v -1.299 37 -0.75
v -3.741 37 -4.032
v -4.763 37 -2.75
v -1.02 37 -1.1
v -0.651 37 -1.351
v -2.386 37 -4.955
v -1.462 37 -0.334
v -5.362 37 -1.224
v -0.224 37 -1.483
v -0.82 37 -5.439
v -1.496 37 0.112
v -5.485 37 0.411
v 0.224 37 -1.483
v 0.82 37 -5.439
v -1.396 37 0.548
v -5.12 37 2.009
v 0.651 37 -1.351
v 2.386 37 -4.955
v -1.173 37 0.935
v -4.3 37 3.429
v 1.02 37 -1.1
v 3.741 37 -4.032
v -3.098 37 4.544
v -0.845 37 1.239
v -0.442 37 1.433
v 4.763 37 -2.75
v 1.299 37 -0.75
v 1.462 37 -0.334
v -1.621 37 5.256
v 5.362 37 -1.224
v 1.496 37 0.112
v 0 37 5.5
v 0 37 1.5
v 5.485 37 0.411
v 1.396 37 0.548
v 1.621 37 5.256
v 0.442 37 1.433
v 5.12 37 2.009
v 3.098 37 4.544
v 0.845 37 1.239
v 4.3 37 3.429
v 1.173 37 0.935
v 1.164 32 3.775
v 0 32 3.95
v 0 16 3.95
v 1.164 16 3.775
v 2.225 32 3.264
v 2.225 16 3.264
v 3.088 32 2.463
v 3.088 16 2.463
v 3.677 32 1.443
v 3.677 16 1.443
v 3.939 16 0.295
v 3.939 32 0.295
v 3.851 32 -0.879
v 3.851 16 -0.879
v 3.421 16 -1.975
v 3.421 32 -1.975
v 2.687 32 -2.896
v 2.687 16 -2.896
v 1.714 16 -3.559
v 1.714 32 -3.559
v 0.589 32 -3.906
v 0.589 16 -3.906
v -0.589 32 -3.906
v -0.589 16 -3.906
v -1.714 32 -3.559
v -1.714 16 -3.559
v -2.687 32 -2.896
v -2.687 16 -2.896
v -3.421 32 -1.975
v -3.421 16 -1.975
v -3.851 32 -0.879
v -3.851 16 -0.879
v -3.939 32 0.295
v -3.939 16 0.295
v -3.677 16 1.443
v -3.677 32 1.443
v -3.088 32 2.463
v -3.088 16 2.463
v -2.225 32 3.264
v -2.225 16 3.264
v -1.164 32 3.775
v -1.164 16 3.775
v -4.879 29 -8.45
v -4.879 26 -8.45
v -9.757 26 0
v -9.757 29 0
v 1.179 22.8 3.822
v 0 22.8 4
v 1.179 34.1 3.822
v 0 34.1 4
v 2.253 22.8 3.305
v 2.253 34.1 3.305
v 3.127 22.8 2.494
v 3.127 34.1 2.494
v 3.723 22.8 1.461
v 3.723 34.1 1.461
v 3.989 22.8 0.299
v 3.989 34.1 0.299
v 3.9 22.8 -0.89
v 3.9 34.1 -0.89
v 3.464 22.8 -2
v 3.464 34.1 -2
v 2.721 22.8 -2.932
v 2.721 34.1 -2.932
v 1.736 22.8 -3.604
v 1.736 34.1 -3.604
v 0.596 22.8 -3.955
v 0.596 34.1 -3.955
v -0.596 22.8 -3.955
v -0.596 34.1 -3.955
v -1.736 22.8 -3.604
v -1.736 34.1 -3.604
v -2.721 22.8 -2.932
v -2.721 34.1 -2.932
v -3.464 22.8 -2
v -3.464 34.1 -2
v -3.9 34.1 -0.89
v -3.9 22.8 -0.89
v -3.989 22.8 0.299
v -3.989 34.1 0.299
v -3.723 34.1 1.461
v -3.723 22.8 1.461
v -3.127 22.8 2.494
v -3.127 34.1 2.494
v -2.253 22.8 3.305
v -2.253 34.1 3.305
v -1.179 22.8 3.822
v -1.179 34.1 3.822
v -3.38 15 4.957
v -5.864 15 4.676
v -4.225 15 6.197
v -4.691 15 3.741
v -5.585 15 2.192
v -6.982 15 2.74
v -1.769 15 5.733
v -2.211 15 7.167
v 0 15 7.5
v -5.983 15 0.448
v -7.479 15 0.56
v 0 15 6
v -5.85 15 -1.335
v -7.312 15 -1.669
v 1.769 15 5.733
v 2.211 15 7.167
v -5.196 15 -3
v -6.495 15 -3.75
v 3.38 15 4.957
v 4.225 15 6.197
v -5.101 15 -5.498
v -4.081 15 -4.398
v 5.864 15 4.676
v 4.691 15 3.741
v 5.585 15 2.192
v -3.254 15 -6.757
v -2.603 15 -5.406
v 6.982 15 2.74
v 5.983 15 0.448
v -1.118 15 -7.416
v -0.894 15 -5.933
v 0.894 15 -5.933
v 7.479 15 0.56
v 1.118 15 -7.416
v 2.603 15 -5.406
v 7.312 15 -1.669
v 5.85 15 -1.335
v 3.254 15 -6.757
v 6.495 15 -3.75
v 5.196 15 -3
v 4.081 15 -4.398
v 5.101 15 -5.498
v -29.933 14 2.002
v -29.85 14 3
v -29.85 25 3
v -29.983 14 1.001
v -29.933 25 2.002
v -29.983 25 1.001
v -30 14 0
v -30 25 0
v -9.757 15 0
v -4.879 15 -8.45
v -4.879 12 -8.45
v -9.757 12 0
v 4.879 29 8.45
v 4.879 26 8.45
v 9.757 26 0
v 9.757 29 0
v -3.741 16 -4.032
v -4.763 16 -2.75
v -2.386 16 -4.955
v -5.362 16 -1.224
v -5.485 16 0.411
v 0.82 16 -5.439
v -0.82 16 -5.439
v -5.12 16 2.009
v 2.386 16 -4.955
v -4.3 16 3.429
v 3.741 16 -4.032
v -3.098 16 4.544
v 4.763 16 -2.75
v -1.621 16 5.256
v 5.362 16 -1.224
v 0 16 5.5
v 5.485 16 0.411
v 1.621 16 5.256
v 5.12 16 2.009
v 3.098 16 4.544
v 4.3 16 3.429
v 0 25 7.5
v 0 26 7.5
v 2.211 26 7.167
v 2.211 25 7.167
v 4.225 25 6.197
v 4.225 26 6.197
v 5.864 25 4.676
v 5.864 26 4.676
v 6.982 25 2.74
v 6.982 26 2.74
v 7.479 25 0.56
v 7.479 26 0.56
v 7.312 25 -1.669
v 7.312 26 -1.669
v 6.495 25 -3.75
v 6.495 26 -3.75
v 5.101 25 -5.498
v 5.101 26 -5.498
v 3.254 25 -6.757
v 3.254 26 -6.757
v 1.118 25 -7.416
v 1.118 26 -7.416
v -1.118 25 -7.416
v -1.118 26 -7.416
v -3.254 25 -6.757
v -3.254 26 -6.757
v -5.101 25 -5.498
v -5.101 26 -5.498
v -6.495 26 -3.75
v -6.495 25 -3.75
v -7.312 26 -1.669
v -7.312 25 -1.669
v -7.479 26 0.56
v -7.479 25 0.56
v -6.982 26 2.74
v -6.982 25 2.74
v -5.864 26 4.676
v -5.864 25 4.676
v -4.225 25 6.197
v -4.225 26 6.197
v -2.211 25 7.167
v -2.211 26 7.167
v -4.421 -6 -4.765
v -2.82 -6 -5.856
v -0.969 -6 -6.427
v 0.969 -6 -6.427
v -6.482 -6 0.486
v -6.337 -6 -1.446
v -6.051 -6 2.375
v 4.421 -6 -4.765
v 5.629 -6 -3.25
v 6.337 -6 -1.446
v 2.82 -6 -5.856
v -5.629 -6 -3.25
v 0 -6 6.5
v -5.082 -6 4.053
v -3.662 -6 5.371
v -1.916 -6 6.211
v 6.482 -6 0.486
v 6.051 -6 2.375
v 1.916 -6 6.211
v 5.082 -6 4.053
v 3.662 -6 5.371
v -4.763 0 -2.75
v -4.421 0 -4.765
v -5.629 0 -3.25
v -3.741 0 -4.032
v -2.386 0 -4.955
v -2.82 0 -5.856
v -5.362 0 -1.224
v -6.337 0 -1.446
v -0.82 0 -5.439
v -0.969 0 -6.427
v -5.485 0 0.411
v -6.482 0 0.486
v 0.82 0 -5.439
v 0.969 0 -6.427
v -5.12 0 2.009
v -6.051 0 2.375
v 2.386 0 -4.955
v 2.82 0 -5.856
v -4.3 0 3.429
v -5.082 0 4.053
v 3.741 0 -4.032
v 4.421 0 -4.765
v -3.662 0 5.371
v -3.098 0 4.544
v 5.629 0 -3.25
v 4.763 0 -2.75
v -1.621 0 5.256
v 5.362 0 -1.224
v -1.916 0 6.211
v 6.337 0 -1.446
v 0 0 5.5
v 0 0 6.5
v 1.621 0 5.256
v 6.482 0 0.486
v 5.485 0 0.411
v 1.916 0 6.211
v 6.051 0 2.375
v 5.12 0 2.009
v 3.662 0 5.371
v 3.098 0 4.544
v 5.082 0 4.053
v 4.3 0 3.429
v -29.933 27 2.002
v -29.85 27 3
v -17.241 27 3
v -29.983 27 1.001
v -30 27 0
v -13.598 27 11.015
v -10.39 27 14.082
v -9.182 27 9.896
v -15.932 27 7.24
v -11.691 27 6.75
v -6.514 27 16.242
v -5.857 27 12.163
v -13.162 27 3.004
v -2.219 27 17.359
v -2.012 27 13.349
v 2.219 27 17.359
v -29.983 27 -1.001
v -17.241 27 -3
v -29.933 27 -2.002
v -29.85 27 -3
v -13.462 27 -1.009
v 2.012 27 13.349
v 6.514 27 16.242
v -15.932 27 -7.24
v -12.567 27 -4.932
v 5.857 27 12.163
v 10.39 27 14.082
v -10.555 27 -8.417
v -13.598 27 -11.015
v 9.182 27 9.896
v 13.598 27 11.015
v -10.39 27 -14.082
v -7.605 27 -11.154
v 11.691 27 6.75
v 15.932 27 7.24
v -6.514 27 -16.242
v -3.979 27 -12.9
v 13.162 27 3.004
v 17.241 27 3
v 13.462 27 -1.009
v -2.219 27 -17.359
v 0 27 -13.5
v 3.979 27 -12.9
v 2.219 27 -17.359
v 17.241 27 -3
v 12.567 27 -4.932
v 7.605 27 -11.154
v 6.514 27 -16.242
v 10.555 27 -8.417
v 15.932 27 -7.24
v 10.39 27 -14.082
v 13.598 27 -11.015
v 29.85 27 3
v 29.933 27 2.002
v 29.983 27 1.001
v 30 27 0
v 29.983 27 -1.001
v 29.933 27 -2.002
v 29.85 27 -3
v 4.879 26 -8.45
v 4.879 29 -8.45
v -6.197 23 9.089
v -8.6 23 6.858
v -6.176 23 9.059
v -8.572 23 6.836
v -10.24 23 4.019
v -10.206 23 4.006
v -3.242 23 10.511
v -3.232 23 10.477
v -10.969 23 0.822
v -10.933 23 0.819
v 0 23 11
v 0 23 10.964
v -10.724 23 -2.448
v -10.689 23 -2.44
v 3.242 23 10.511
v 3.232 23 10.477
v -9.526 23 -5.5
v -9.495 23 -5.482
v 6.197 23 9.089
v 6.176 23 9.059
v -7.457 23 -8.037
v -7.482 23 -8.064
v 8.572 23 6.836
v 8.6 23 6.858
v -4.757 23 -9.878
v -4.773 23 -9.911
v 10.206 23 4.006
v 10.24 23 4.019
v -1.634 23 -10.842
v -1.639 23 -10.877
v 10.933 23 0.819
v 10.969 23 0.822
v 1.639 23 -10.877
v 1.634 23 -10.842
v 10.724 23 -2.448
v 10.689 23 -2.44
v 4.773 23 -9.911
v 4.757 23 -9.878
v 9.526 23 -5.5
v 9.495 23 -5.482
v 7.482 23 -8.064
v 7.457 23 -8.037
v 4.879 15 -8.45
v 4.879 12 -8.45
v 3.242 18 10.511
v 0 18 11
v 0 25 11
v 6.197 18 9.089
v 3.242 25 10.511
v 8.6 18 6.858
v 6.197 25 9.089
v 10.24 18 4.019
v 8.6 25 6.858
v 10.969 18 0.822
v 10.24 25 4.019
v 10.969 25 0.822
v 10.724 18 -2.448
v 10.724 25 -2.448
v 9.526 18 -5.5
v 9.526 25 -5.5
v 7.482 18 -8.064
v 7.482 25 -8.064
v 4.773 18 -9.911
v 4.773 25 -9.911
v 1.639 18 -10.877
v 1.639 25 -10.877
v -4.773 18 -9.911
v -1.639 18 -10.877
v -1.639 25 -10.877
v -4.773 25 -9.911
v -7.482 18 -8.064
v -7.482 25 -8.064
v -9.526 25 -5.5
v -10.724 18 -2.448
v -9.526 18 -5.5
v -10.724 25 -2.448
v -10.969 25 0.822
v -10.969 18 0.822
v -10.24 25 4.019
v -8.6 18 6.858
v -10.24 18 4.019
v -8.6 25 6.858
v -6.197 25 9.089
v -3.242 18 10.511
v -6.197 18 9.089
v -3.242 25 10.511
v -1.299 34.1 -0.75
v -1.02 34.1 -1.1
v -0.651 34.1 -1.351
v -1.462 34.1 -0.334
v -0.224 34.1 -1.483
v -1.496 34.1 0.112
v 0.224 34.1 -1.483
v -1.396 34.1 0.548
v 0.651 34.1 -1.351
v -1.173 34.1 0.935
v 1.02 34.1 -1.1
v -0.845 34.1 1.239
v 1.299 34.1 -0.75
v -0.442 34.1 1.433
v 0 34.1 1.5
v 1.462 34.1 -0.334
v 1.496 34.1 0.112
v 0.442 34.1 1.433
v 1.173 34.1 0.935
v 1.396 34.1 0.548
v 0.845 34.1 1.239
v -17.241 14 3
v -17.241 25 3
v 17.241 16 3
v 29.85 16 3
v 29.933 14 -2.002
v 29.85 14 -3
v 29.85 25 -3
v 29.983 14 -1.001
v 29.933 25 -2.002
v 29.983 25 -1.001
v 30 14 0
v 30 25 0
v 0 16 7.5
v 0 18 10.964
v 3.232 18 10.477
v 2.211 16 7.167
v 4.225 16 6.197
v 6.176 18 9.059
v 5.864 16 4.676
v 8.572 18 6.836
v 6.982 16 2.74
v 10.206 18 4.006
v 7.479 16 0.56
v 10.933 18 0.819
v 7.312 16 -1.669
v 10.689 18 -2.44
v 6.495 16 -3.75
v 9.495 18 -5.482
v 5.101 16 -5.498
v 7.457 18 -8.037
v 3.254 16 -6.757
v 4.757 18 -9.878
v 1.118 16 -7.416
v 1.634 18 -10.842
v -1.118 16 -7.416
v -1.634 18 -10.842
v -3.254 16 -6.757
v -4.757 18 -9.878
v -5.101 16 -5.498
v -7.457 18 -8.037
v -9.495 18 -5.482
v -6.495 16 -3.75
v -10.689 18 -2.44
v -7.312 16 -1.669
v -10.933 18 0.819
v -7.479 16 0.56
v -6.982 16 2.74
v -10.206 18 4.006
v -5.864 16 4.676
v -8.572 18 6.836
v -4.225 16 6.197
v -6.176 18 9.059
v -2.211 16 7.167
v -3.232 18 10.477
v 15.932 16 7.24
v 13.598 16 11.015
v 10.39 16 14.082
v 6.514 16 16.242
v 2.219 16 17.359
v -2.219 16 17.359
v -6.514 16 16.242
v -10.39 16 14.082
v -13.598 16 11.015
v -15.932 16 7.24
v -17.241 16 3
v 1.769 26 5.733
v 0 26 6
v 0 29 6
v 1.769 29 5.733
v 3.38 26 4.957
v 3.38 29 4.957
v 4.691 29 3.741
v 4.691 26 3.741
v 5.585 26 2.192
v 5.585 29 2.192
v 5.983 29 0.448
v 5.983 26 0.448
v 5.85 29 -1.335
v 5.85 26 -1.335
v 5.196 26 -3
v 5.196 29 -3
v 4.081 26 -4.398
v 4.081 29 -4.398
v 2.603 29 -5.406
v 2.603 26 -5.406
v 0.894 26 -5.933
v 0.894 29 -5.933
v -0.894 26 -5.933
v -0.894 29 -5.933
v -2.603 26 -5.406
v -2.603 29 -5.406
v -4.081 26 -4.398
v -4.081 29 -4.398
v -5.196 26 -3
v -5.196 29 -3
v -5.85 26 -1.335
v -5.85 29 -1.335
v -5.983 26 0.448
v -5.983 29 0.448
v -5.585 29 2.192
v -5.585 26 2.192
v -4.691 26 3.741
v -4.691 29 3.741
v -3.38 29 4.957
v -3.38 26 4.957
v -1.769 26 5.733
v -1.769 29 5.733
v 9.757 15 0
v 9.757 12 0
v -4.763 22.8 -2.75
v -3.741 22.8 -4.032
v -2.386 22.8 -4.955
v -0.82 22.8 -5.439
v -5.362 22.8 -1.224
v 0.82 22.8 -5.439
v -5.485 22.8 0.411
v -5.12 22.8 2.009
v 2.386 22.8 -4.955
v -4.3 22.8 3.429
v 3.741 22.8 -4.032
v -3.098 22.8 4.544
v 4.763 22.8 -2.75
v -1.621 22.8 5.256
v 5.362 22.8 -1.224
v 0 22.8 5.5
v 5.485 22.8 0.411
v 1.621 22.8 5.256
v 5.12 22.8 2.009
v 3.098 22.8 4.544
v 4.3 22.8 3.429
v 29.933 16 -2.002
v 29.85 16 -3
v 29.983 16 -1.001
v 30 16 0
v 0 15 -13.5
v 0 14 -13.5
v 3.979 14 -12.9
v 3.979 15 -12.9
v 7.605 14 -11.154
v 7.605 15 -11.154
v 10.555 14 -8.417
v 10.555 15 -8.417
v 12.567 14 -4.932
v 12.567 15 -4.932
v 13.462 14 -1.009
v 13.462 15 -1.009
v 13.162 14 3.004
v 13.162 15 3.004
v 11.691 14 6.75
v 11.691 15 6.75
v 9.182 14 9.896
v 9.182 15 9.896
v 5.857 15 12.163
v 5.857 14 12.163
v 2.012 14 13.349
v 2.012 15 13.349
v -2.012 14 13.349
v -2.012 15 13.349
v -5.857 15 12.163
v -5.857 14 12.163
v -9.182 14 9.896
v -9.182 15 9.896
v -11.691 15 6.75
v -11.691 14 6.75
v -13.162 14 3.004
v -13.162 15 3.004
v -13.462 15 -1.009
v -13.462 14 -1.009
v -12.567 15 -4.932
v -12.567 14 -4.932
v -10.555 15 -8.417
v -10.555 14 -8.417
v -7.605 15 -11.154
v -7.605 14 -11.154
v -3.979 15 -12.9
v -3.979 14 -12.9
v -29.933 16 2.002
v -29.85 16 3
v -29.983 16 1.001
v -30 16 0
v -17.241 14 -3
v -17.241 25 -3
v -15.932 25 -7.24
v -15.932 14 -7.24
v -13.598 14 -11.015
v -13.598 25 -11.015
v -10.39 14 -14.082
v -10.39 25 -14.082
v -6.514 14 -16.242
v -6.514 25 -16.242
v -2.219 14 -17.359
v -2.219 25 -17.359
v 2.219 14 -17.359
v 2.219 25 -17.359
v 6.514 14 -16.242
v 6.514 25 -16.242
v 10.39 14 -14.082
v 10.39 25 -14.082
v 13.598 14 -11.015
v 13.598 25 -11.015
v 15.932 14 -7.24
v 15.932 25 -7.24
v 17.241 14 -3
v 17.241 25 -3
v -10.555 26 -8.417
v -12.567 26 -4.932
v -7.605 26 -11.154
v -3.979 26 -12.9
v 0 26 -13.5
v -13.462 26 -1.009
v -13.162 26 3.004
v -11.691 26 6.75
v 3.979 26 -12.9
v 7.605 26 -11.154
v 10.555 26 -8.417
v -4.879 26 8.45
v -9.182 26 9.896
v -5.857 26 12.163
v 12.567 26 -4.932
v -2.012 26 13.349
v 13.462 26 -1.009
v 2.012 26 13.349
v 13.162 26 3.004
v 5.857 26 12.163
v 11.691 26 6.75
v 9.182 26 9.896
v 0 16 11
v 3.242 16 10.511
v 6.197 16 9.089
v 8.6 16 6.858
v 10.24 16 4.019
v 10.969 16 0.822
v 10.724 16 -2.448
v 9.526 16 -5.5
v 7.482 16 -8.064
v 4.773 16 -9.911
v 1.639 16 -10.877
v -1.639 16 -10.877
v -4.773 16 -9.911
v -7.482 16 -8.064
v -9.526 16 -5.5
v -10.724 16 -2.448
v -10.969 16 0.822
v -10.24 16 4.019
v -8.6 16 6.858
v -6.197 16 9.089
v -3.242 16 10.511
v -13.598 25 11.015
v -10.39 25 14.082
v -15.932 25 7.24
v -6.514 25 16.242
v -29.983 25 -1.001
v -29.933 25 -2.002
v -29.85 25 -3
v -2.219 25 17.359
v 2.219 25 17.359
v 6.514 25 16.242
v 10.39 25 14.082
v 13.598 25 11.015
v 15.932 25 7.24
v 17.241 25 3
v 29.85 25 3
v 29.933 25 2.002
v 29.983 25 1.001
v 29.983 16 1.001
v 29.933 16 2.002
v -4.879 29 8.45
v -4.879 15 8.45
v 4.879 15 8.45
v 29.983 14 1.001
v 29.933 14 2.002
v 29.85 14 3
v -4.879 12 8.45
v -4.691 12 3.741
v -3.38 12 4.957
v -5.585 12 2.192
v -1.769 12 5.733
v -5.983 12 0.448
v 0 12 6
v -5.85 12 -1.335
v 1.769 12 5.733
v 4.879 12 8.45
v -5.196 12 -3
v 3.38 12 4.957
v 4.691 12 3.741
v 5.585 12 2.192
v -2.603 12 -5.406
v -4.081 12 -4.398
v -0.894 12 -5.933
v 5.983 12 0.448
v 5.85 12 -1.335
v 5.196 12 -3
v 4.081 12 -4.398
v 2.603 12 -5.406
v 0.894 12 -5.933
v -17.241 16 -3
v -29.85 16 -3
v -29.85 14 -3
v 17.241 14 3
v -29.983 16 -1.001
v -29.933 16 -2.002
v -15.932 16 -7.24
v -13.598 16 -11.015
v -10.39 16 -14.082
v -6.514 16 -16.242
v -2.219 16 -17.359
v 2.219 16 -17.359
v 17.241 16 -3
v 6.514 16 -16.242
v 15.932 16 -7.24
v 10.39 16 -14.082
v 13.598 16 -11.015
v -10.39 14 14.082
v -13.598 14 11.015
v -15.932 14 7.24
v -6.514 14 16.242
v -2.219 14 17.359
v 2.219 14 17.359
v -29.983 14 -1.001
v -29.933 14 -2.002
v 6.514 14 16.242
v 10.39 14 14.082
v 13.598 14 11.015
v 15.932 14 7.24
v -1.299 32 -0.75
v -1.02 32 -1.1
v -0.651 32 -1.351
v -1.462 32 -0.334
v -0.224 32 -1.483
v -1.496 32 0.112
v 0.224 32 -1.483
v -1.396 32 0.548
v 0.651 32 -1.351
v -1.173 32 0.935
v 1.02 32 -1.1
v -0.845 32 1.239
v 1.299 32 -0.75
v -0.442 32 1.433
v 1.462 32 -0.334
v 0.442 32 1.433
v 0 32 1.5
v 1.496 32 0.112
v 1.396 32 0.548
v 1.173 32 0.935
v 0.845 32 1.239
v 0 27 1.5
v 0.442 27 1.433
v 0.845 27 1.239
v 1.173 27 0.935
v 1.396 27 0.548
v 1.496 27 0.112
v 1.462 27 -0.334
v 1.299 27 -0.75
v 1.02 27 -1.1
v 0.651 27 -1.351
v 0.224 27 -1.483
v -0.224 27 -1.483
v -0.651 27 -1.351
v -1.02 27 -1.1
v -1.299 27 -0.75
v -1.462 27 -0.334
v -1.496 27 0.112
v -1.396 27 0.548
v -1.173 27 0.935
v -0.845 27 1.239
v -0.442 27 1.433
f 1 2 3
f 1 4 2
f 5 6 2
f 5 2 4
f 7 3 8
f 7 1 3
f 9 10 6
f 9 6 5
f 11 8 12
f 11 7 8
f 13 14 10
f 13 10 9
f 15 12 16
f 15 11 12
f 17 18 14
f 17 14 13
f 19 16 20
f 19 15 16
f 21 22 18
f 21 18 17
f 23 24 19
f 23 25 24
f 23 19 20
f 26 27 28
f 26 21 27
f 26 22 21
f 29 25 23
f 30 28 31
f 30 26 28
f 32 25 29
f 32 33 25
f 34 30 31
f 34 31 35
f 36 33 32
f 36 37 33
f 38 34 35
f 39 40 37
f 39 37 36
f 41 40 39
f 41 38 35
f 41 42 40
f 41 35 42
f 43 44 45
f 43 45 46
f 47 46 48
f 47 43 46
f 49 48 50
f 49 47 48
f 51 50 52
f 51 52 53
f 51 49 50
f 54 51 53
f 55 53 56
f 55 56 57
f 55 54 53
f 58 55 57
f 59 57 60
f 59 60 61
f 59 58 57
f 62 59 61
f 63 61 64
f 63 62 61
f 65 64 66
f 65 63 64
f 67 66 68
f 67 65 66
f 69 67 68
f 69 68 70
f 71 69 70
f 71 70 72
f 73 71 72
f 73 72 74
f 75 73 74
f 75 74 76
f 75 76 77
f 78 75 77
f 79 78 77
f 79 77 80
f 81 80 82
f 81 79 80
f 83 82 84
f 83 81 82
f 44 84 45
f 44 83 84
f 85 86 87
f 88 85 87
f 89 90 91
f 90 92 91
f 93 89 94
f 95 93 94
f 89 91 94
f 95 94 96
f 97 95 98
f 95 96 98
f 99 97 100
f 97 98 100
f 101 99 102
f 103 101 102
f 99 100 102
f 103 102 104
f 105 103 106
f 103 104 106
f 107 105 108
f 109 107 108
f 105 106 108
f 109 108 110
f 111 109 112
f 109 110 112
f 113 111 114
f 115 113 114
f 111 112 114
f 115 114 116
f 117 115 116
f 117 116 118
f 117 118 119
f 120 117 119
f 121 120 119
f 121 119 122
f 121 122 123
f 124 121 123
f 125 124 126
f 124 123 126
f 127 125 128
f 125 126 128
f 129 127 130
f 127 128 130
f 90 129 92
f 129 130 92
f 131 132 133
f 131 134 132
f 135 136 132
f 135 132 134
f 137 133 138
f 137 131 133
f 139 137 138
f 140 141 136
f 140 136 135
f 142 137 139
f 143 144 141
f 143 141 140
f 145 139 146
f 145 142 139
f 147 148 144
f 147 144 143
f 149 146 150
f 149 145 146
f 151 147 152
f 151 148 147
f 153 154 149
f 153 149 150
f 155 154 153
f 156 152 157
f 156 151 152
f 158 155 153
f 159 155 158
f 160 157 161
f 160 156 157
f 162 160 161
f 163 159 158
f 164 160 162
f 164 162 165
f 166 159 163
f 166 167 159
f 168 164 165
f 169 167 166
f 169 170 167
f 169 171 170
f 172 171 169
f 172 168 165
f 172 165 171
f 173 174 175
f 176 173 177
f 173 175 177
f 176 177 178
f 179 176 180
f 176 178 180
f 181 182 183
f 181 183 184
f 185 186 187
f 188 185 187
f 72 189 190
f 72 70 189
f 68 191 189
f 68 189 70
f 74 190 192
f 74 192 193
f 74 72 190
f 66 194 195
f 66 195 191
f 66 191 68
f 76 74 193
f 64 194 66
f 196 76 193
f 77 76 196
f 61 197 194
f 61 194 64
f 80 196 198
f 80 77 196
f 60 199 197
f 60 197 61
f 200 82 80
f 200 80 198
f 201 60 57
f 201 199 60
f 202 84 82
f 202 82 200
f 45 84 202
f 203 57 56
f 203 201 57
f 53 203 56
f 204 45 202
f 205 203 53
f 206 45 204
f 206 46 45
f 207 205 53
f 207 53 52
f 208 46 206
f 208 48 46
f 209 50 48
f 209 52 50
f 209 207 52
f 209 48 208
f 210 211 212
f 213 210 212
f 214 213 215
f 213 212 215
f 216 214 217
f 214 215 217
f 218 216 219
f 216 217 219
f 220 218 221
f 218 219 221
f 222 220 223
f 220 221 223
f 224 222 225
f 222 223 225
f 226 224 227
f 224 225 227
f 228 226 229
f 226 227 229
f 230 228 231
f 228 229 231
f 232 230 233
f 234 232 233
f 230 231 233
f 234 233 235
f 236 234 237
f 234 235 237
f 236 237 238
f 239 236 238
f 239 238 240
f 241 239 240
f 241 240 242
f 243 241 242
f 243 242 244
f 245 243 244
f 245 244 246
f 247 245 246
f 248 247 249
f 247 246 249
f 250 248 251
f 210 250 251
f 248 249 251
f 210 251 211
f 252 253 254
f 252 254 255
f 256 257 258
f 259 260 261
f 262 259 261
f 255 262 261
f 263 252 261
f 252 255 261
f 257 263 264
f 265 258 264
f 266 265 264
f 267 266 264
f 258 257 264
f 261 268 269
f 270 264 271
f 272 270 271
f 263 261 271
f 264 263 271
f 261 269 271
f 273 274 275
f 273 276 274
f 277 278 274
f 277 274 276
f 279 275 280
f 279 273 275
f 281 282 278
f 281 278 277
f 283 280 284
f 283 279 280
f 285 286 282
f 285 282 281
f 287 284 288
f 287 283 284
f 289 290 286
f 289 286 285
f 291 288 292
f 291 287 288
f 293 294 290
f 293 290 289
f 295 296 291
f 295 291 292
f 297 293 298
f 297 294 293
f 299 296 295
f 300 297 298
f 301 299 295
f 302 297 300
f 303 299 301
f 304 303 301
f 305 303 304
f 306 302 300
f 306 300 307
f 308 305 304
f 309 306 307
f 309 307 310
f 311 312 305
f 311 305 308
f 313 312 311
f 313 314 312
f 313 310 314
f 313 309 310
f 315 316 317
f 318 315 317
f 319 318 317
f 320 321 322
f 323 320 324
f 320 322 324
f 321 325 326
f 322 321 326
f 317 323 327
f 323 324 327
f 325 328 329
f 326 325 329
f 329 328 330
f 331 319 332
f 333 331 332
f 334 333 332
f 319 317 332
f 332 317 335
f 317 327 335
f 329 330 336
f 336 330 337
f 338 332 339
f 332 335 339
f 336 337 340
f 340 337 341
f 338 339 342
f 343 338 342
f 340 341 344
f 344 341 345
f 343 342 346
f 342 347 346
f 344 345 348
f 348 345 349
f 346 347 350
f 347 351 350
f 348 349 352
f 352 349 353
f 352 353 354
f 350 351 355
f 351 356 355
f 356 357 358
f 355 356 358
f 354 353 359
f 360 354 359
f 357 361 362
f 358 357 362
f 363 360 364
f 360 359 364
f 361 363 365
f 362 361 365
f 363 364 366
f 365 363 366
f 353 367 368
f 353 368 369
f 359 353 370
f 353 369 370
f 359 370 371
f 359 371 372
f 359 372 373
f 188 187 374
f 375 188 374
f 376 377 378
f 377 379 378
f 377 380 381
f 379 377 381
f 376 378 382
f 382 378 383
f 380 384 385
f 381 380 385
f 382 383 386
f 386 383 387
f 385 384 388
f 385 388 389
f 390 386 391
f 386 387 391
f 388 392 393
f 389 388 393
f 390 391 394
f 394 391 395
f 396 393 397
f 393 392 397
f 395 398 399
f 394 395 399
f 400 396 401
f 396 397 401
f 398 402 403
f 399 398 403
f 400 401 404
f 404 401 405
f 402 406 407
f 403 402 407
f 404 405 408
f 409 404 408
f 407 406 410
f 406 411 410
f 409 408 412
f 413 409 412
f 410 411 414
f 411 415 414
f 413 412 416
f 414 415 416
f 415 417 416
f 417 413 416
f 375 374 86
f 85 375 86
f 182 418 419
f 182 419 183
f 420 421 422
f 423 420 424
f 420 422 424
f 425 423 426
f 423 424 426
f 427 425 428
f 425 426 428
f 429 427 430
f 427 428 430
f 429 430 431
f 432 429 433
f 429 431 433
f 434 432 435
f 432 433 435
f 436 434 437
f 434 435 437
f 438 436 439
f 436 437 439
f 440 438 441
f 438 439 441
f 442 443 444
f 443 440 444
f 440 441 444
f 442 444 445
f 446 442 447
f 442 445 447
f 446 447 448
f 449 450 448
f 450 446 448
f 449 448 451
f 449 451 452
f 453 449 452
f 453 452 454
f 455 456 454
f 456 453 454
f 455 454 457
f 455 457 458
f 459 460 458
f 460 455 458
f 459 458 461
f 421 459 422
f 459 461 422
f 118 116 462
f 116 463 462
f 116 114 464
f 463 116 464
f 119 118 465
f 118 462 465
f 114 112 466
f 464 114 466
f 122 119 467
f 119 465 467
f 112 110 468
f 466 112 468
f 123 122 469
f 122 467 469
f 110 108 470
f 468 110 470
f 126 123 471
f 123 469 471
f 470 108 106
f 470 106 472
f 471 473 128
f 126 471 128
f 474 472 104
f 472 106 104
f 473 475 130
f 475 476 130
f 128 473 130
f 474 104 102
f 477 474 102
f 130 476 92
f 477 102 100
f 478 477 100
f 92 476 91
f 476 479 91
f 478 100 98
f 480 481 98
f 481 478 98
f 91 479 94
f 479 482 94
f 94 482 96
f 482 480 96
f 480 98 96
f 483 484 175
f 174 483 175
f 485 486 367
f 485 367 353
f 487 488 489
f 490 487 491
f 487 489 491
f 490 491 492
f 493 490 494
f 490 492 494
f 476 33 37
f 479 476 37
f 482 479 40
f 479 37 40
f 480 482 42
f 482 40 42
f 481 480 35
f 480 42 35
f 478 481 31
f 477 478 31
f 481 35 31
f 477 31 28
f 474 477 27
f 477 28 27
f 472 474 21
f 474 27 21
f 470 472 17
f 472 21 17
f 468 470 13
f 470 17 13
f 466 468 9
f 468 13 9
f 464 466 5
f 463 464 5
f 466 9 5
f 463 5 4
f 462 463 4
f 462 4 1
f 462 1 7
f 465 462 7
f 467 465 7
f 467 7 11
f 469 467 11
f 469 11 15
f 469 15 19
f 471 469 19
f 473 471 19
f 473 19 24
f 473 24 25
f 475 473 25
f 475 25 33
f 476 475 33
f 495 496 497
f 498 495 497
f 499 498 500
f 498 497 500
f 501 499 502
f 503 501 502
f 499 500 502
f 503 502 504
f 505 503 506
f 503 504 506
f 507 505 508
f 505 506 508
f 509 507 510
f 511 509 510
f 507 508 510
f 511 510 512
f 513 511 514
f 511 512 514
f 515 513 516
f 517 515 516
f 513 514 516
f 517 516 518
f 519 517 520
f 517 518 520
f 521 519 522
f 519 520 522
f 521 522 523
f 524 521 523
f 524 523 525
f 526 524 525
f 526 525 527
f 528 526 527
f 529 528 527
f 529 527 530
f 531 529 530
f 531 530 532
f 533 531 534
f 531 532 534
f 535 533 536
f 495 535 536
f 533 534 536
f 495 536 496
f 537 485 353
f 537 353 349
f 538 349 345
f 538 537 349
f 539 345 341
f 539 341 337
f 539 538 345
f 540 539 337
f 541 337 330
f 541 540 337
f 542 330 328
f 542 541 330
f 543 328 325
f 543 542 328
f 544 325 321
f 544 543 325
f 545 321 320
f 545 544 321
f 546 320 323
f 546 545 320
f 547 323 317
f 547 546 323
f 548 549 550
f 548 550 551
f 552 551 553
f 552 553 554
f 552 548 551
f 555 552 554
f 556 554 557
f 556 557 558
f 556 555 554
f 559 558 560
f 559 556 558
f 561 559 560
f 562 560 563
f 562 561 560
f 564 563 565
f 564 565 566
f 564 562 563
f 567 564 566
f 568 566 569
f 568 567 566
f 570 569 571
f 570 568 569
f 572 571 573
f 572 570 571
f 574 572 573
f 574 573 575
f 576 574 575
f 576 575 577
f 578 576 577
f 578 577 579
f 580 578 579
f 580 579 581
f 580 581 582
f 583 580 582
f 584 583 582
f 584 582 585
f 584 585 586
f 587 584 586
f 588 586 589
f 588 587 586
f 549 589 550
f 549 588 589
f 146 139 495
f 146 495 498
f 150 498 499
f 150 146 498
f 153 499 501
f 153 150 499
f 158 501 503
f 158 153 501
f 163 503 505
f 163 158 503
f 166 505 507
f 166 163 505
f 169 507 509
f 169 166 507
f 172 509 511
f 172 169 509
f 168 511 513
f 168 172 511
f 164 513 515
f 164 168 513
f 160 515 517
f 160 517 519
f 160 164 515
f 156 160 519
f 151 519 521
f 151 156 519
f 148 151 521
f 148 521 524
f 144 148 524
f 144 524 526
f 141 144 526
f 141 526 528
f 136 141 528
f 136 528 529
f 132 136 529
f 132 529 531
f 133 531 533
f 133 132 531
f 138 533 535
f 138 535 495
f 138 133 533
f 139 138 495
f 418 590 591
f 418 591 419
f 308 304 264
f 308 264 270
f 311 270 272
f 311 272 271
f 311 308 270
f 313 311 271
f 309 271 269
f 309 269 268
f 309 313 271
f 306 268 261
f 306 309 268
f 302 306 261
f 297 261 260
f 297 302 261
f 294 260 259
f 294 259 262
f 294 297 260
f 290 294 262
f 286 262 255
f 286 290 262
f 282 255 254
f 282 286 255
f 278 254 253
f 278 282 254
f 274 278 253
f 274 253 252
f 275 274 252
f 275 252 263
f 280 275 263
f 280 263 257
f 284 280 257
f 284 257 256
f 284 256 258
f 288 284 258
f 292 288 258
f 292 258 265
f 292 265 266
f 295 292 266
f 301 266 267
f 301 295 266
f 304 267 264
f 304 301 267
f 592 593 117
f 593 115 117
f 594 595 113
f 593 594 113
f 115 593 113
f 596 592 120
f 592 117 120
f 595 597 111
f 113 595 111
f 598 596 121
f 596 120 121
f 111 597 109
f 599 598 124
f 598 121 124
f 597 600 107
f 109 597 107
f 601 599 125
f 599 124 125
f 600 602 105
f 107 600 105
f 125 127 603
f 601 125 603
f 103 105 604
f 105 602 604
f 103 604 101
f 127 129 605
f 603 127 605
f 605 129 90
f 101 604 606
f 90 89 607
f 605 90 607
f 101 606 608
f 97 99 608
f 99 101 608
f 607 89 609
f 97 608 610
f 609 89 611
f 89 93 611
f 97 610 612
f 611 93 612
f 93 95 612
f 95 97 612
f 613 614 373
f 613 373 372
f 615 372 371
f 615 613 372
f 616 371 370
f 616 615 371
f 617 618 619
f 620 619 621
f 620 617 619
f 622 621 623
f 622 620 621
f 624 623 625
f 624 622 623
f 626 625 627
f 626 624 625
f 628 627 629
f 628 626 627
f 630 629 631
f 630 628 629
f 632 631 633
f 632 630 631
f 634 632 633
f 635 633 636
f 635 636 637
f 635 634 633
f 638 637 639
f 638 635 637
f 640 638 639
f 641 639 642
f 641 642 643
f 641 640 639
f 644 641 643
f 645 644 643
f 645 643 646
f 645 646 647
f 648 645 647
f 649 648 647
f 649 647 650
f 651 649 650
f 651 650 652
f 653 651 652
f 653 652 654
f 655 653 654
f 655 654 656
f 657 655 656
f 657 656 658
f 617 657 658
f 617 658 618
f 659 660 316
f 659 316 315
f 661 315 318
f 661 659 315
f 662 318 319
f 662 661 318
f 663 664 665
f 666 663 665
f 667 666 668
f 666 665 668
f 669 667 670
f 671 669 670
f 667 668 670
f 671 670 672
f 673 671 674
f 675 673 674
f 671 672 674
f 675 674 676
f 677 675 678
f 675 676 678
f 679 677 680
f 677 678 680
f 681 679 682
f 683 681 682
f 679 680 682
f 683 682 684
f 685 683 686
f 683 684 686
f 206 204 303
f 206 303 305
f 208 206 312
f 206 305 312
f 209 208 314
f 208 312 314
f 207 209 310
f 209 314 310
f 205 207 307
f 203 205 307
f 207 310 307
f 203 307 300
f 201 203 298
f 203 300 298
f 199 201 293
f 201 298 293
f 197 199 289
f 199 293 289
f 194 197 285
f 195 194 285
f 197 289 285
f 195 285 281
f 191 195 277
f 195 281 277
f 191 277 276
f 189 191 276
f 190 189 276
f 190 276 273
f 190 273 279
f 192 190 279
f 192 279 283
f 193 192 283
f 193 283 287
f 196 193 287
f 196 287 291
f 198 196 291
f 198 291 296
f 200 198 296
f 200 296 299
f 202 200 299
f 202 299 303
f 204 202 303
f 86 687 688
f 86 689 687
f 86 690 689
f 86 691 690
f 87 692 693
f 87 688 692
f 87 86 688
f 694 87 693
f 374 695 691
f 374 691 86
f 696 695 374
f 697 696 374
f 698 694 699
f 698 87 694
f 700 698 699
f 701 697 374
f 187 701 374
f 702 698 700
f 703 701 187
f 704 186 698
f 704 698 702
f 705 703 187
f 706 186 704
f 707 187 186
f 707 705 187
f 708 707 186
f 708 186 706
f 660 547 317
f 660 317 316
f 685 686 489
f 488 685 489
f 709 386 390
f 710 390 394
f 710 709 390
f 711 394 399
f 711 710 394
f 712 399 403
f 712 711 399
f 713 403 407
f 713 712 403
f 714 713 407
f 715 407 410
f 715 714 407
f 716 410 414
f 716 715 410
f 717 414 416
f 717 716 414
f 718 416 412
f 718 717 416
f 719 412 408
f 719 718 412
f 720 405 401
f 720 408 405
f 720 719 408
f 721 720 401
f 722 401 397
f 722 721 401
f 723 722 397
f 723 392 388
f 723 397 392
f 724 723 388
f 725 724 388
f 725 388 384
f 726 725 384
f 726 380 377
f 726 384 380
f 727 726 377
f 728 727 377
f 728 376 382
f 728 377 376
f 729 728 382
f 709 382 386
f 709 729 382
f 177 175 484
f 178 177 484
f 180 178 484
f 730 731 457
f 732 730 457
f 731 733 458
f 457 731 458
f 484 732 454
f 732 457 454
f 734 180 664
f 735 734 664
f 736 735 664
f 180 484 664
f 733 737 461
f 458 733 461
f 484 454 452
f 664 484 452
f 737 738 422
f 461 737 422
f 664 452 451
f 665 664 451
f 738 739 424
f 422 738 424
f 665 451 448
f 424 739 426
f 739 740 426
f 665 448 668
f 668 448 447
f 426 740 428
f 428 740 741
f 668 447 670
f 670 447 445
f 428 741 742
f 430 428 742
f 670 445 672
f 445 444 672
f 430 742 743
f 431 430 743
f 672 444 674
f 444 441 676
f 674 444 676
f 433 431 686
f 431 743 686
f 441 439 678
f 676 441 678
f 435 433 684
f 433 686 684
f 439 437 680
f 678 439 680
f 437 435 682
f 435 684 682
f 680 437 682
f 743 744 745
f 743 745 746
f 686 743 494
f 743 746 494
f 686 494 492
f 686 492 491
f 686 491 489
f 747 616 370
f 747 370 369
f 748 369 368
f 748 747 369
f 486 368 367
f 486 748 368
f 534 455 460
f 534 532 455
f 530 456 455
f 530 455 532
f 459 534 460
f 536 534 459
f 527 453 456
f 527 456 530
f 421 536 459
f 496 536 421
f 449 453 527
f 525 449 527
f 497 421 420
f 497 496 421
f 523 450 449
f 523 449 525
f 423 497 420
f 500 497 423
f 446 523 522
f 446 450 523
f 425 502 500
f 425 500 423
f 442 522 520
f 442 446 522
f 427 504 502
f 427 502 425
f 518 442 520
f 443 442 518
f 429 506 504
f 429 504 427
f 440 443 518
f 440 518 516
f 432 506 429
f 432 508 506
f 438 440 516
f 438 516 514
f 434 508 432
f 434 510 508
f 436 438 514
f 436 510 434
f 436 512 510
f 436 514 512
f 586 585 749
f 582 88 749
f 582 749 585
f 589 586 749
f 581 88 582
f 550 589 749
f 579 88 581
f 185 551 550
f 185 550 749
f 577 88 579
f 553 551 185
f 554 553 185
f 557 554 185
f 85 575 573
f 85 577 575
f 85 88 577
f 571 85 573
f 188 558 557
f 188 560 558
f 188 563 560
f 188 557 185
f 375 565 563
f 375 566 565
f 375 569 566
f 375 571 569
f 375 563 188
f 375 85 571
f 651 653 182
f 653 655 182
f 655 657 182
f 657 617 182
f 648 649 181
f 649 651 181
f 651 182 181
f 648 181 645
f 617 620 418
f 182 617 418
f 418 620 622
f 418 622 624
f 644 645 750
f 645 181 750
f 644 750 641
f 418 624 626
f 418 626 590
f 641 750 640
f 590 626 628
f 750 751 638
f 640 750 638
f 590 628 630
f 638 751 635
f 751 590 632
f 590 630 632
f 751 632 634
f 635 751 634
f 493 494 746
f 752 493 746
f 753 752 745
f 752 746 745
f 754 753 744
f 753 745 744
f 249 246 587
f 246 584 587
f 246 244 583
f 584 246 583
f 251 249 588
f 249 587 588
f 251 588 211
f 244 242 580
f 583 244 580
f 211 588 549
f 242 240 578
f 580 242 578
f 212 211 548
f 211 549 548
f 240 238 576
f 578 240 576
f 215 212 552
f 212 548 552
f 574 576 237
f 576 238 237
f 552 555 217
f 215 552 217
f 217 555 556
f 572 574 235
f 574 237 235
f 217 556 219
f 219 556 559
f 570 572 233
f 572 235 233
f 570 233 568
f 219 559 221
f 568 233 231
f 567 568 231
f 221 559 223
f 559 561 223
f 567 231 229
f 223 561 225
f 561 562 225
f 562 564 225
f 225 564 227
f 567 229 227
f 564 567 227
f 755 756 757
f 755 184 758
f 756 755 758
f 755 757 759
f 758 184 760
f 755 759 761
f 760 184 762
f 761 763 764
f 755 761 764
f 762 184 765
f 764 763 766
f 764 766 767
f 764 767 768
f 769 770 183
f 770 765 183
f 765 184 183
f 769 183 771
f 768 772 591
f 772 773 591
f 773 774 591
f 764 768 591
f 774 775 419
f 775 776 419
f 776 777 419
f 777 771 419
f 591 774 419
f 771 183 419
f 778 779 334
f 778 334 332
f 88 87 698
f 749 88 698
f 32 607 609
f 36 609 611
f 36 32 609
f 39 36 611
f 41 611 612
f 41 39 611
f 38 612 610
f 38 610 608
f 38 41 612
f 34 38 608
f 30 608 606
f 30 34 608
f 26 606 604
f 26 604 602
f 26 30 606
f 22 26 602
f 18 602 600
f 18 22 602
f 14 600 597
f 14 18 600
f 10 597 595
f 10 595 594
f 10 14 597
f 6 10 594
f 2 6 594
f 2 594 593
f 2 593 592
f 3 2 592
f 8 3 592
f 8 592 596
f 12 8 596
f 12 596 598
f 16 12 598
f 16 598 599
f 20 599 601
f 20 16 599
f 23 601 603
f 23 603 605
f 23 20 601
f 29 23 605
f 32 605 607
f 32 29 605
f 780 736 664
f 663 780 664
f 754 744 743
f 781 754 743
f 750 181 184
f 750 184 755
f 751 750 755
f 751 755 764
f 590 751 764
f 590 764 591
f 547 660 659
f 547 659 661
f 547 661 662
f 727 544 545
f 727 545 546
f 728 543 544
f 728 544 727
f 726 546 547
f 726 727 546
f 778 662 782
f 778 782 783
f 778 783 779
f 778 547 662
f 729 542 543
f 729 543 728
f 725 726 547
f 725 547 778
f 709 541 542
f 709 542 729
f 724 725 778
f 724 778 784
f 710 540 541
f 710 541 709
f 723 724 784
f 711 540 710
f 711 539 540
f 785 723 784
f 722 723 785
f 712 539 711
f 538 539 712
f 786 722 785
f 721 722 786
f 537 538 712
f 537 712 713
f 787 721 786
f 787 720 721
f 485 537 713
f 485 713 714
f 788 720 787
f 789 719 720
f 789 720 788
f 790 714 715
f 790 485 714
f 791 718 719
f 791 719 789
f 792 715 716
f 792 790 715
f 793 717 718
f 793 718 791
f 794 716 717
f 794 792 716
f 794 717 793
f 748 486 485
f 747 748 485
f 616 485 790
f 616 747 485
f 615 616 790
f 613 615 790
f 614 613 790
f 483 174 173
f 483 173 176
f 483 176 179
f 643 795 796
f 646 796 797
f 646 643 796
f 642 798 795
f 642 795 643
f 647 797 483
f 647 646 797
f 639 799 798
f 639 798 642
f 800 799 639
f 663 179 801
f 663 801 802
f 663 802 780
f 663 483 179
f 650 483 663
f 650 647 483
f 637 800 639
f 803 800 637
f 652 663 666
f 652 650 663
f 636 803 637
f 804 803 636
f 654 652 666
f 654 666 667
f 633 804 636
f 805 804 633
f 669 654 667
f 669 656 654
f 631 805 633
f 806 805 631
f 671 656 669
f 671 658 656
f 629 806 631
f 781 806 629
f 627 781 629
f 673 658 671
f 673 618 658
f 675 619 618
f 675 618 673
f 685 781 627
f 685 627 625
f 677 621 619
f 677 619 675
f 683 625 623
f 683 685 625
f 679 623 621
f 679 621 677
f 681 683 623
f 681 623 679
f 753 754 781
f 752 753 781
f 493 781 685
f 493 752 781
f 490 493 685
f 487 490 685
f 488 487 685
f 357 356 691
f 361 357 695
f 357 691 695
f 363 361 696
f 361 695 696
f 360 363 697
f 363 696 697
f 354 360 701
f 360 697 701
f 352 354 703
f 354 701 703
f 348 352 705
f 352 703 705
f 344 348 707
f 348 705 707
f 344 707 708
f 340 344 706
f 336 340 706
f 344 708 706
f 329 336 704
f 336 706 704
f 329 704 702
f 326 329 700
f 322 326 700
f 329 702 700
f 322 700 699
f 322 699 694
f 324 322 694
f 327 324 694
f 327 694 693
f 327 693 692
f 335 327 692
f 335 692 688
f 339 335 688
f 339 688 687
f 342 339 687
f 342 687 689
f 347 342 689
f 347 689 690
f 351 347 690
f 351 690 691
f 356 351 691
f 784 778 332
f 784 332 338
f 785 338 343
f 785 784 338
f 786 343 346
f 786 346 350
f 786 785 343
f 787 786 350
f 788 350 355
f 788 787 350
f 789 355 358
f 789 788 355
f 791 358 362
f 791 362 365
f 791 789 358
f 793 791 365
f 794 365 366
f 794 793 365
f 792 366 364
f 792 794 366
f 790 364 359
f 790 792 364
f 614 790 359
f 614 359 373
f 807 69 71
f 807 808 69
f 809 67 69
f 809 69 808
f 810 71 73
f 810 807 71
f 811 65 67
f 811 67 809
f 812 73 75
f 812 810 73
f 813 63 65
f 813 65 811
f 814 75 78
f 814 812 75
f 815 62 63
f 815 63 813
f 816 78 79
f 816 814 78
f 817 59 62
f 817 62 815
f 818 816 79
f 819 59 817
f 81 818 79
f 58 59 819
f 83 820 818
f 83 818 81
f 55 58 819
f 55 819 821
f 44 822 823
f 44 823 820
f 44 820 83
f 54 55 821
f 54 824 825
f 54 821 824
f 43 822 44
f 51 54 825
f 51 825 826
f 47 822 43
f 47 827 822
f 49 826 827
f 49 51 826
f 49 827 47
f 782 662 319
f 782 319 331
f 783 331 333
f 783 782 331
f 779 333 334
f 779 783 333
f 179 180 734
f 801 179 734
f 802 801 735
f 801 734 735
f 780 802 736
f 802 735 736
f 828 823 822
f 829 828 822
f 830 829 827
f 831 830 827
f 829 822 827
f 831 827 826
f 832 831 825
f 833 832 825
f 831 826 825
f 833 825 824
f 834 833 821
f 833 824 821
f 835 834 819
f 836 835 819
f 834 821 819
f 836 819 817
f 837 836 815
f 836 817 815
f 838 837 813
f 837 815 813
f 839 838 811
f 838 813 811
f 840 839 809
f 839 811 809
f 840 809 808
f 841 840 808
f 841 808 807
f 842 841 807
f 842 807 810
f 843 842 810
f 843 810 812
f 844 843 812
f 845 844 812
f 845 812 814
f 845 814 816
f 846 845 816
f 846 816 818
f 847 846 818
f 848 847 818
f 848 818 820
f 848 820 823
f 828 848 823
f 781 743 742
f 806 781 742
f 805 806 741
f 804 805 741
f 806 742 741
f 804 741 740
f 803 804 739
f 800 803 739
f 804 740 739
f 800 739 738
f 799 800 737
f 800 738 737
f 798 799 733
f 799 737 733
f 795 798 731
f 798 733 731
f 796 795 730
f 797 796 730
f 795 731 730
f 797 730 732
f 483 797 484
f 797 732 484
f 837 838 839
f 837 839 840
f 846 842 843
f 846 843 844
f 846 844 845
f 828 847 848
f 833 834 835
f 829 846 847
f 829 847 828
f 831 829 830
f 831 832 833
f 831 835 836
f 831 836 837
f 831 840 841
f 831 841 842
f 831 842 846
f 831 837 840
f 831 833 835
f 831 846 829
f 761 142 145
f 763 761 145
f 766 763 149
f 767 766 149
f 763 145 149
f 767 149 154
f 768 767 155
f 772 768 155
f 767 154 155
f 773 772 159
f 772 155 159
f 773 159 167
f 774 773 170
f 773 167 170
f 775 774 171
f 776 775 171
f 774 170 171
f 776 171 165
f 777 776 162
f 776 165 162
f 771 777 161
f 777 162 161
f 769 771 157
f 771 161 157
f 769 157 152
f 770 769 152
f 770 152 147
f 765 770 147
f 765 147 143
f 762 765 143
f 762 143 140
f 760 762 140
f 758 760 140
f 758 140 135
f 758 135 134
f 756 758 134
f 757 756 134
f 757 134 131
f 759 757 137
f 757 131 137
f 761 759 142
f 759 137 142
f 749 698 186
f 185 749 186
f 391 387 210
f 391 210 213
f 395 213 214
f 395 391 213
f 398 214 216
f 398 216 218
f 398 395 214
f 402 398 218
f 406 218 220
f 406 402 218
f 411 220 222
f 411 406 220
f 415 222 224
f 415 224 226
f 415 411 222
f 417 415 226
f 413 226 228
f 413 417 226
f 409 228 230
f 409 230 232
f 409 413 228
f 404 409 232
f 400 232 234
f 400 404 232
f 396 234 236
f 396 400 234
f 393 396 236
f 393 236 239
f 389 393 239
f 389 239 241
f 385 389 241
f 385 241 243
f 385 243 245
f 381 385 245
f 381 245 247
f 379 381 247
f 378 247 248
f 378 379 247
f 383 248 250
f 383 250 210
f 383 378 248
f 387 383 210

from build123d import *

# Parameters (mm, degrees)
SKETCH2_R                = 5.5
BOSS_EXTRUDE1_DEPTH      = 32
SKETCH2_3_R              = 6.5
SKETCH2_3_R_2            = 5.5
BOSS_EXTRUDE2_DEPTH      = 6
SKETCH5_R                = 5.5
SKETCH5_R_2              = 3.95
CUT_EXTRUDE1_DEPTH       = 16
SKETCH6_R                = 13.5
SKETCH6_R_2              = 11
BOSS_EXTRUDE4_DEPTH      = 10
SKETCH7_R                = 11.05
SKETCH7_R_2              = 7.5
BOSS_EXTRUDE5_DEPTH      = 3
SKETCH9_R                = 17.5
SKETCH9_R_2              = 13.5
BOSS_EXTRUDE6_DEPTH      = 11
SKETCH10_R               = 6
BOSS_EXTRUDE7_DEPTH      = 3
CHAMFER2_SIZE            = 2
CHAMFER2_SIZE2           = 3.464101615
BOSS_EXTRUDE8_DEPTH      = 11
SKETCH12_R               = 5.5
SKETCH12_R_2             = 4
BOSS_EXTRUDE9_DEPTH      = 5
BOSS_EXTRUDE9_DEPTH_BACK = 9.2
SKETCH16_R               = 4
BOSS_EXTRUDE10_DEPTH     = 2.9
SKETCH17_R               = 1.5
CUT_EXTRUDE2_DEPTH       = 10


with BuildPart() as part:
    # Sketch2 → Boss-Extrude1 (new body)
    with BuildSketch(Plane(origin=(0, 0, 0), x_dir=(1, 0, 0), z_dir=(0, 1, 0))):
        with Locations(Location((0, 0, 0), (0, 0, 270))):
            Circle(SKETCH2_R)
    extrude(amount=BOSS_EXTRUDE1_DEPTH)

    # Sketch5 → Cut-Extrude1 (cut)
    with BuildSketch(Plane(origin=(0, 32, 0), x_dir=(1, 0, 0), z_dir=(0, 1, 0))):
        with Locations(Location((0, 0, 0), (0, 0, 270))):
            Circle(SKETCH5_R)
        with Locations(Location((0, 0, 0), (0, 0, 270))):
            Circle(SKETCH5_R_2, mode=Mode.SUBTRACT)
    extrude(amount=-CUT_EXTRUDE1_DEPTH, mode=Mode.SUBTRACT)


with BuildPart() as body_2:
    # Sketch2<3> → Boss-Extrude2 (new body)
    with BuildSketch(Plane(origin=(0, 0, 0), x_dir=(1, 0, 0), z_dir=(0, 1, 0))):
        with Locations(Location((0, 0, 0), (0, 0, 270))):
            Circle(SKETCH2_3_R)
        with Locations(Location((0, 0, 0), (0, 0, 270))):
            Circle(SKETCH2_3_R_2, mode=Mode.SUBTRACT)
        with Locations(Location((0, 0, 0), (0, 0, 270))):
            Circle(SKETCH2_3_R_2)
    extrude(amount=-BOSS_EXTRUDE2_DEPTH)


with BuildPart() as body_3:
    # Sketch6 → Boss-Extrude4 (new body)
    with BuildSketch(Plane(origin=(0, 16, 0), x_dir=(1, 0, 0), z_dir=(0, 1, 0))):
        with Locations(Location((0, 0, 0), (0, 0, 270))):
            Circle(SKETCH6_R)
        with Locations(Location((0, 0, 0), (0, 0, 270))):
            Circle(SKETCH6_R_2, mode=Mode.SUBTRACT)
    extrude(amount=BOSS_EXTRUDE4_DEPTH)

    # Sketch7 → Boss-Extrude5 (add)
    with BuildSketch(Plane(origin=(0, 26, 0), x_dir=(1, 0, 0), z_dir=(0, 1, 0))):
        Circle(SKETCH7_R)
        with Locations(Location((0, 0, 0), (0, 0, 270))):
            Circle(SKETCH7_R_2, mode=Mode.SUBTRACT)
    extrude(amount=-BOSS_EXTRUDE5_DEPTH)

    # Sketch9 → Boss-Extrude6 (add)
    with BuildSketch(Plane.XZ.offset(-16)):
        with Locations(Location((0, 0, 0), (0, 0, 270))):
            Circle(SKETCH9_R)
        with Locations(Location((0, 0, 0), (0, 0, 270))):
            Circle(SKETCH9_R_2, mode=Mode.SUBTRACT)
    extrude(amount=-BOSS_EXTRUDE6_DEPTH)

    # Sketch10 → Boss-Extrude7 (add)
    with BuildSketch(Plane(origin=(0, 26, 0), x_dir=(1, 0, 0), z_dir=(0, 1, 0))):
        Polygon((9.757219549, 0), (4.878609775, 8.45), (-4.878609775, 8.45), (-9.757219549, 0), (-4.878609775, -8.45), (4.878609775, -8.45), align=None)
        with Locations(Location((0, 0, 0), (0, 0, 270))):
            Circle(SKETCH10_R, mode=Mode.SUBTRACT)
    extrude(amount=BOSS_EXTRUDE7_DEPTH)

    # Chamfer2
    chamfer2_edges = [body_3.edges().sort_by_distance(p)[0] for p in [
        (0, 23, -7.5),
    ]]
    chamfer2_side = [body_3.faces().sort_by_distance(p)[0] for p in [
        (0, 24.5, -7.5),
    ]]
    chamfer(chamfer2_edges, length=CHAMFER2_SIZE, length2=CHAMFER2_SIZE2, reference=chamfer2_side[0])

    # Sketch11 → Boss-Extrude8 (add)
    with BuildSketch(Plane.XZ.offset(-16)):
        with BuildLine():
            ThreePointArc((17.24093965, 3), (17.435114623, 1.505582301), (17.5, 0))
            Line((17.5, 0), (30, 0))
            ThreePointArc((30, 0), (29.962382193, 1.501883252), (29.849623113, 3))
            Line((29.849623113, 3), (17.24093965, 3))
        make_face()
        with BuildLine():
            Line((-30, 0), (-17.5, 0))
            ThreePointArc((-17.5, 0), (-17.435114623, 1.505582301), (-17.24093965, 3))
            Line((-17.24093965, 3), (-29.849623113, 3))
            ThreePointArc((-29.849623113, 3), (-29.962382193, 1.501883252), (-30, 0))
        make_face()
        with BuildLine():
            Line((30, 0), (17.5, 0))
            ThreePointArc((17.5, 0), (17.435114623, -1.505582301), (17.24093965, -3))
            Line((17.24093965, -3), (29.849623113, -3))
            ThreePointArc((29.849623113, -3), (29.962382193, -1.501883252), (30, 0))
        make_face()
        with BuildLine():
            ThreePointArc((-17.24093965, -3), (-17.435114623, -1.505582301), (-17.5, 0))
            Line((-17.5, 0), (-30, 0))
            ThreePointArc((-30, 0), (-29.962382193, -1.501883252), (-29.849623113, -3))
            Line((-29.849623113, -3), (-17.24093965, -3))
        make_face()
    extrude(amount=-BOSS_EXTRUDE8_DEPTH)


with BuildPart() as body_4:
    # Sketch12 → Boss-Extrude9 (new, two sides)
    with BuildSketch(Plane(origin=(0, 32, 0), x_dir=(1, 0, 0), z_dir=(0, 1, 0))) as boss_extrude9_sk:
        with Locations(Location((0, 0, 0), (0, 0, 270))):
            Circle(SKETCH12_R)
        with Locations(Location((0, 0, 0), (0, 0, 270))):
            Circle(SKETCH12_R_2, mode=Mode.SUBTRACT)
    extrude(amount=BOSS_EXTRUDE9_DEPTH)
    extrude(boss_extrude9_sk.sketch, amount=-BOSS_EXTRUDE9_DEPTH_BACK)

    # Sketch16 → Boss-Extrude10 (add)
    with BuildSketch(Plane(origin=(0, 37, 0), x_dir=(1, 0, 0), z_dir=(0, 1, 0))):
        with Locations(Location((0, 0, 0), (0, 0, 270))):
            Circle(SKETCH16_R)
    extrude(amount=-BOSS_EXTRUDE10_DEPTH)


with BuildPart() as part_1:
    add(part.part)

    # Combine1: union body 2
    add(body_2.part)


with BuildPart() as body_4_2:
    # Mirror1: mirrored copy
    add(body_3.part.mirror(Plane.ZX.offset(20.5)))


with BuildPart() as cut_extrude2_tool:
    # Sketch17 → Cut-Extrude2 (new body)
    with BuildSketch(Plane(origin=(0, 37, 0), x_dir=(1, 0, 0), z_dir=(0, 1, 0))):
        with Locations(Location((0, 0, 0), (0, 0, 270))):
            Circle(SKETCH17_R)
    extrude(amount=-CUT_EXTRUDE2_DEPTH)


with BuildPart() as part_2:
    add(part_1.part)

    # Cut-Extrude2: cut by cut_extrude2_tool
    add(cut_extrude2_tool.part, mode=Mode.SUBTRACT)


with BuildPart() as body_4_1:
    add(body_4.part)

    # Cut-Extrude2: cut by cut_extrude2_tool
    add(cut_extrude2_tool.part, mode=Mode.SUBTRACT)


solid = Compound([body_3.part, body_4_2.part, part_2.part, body_4_1.part])
